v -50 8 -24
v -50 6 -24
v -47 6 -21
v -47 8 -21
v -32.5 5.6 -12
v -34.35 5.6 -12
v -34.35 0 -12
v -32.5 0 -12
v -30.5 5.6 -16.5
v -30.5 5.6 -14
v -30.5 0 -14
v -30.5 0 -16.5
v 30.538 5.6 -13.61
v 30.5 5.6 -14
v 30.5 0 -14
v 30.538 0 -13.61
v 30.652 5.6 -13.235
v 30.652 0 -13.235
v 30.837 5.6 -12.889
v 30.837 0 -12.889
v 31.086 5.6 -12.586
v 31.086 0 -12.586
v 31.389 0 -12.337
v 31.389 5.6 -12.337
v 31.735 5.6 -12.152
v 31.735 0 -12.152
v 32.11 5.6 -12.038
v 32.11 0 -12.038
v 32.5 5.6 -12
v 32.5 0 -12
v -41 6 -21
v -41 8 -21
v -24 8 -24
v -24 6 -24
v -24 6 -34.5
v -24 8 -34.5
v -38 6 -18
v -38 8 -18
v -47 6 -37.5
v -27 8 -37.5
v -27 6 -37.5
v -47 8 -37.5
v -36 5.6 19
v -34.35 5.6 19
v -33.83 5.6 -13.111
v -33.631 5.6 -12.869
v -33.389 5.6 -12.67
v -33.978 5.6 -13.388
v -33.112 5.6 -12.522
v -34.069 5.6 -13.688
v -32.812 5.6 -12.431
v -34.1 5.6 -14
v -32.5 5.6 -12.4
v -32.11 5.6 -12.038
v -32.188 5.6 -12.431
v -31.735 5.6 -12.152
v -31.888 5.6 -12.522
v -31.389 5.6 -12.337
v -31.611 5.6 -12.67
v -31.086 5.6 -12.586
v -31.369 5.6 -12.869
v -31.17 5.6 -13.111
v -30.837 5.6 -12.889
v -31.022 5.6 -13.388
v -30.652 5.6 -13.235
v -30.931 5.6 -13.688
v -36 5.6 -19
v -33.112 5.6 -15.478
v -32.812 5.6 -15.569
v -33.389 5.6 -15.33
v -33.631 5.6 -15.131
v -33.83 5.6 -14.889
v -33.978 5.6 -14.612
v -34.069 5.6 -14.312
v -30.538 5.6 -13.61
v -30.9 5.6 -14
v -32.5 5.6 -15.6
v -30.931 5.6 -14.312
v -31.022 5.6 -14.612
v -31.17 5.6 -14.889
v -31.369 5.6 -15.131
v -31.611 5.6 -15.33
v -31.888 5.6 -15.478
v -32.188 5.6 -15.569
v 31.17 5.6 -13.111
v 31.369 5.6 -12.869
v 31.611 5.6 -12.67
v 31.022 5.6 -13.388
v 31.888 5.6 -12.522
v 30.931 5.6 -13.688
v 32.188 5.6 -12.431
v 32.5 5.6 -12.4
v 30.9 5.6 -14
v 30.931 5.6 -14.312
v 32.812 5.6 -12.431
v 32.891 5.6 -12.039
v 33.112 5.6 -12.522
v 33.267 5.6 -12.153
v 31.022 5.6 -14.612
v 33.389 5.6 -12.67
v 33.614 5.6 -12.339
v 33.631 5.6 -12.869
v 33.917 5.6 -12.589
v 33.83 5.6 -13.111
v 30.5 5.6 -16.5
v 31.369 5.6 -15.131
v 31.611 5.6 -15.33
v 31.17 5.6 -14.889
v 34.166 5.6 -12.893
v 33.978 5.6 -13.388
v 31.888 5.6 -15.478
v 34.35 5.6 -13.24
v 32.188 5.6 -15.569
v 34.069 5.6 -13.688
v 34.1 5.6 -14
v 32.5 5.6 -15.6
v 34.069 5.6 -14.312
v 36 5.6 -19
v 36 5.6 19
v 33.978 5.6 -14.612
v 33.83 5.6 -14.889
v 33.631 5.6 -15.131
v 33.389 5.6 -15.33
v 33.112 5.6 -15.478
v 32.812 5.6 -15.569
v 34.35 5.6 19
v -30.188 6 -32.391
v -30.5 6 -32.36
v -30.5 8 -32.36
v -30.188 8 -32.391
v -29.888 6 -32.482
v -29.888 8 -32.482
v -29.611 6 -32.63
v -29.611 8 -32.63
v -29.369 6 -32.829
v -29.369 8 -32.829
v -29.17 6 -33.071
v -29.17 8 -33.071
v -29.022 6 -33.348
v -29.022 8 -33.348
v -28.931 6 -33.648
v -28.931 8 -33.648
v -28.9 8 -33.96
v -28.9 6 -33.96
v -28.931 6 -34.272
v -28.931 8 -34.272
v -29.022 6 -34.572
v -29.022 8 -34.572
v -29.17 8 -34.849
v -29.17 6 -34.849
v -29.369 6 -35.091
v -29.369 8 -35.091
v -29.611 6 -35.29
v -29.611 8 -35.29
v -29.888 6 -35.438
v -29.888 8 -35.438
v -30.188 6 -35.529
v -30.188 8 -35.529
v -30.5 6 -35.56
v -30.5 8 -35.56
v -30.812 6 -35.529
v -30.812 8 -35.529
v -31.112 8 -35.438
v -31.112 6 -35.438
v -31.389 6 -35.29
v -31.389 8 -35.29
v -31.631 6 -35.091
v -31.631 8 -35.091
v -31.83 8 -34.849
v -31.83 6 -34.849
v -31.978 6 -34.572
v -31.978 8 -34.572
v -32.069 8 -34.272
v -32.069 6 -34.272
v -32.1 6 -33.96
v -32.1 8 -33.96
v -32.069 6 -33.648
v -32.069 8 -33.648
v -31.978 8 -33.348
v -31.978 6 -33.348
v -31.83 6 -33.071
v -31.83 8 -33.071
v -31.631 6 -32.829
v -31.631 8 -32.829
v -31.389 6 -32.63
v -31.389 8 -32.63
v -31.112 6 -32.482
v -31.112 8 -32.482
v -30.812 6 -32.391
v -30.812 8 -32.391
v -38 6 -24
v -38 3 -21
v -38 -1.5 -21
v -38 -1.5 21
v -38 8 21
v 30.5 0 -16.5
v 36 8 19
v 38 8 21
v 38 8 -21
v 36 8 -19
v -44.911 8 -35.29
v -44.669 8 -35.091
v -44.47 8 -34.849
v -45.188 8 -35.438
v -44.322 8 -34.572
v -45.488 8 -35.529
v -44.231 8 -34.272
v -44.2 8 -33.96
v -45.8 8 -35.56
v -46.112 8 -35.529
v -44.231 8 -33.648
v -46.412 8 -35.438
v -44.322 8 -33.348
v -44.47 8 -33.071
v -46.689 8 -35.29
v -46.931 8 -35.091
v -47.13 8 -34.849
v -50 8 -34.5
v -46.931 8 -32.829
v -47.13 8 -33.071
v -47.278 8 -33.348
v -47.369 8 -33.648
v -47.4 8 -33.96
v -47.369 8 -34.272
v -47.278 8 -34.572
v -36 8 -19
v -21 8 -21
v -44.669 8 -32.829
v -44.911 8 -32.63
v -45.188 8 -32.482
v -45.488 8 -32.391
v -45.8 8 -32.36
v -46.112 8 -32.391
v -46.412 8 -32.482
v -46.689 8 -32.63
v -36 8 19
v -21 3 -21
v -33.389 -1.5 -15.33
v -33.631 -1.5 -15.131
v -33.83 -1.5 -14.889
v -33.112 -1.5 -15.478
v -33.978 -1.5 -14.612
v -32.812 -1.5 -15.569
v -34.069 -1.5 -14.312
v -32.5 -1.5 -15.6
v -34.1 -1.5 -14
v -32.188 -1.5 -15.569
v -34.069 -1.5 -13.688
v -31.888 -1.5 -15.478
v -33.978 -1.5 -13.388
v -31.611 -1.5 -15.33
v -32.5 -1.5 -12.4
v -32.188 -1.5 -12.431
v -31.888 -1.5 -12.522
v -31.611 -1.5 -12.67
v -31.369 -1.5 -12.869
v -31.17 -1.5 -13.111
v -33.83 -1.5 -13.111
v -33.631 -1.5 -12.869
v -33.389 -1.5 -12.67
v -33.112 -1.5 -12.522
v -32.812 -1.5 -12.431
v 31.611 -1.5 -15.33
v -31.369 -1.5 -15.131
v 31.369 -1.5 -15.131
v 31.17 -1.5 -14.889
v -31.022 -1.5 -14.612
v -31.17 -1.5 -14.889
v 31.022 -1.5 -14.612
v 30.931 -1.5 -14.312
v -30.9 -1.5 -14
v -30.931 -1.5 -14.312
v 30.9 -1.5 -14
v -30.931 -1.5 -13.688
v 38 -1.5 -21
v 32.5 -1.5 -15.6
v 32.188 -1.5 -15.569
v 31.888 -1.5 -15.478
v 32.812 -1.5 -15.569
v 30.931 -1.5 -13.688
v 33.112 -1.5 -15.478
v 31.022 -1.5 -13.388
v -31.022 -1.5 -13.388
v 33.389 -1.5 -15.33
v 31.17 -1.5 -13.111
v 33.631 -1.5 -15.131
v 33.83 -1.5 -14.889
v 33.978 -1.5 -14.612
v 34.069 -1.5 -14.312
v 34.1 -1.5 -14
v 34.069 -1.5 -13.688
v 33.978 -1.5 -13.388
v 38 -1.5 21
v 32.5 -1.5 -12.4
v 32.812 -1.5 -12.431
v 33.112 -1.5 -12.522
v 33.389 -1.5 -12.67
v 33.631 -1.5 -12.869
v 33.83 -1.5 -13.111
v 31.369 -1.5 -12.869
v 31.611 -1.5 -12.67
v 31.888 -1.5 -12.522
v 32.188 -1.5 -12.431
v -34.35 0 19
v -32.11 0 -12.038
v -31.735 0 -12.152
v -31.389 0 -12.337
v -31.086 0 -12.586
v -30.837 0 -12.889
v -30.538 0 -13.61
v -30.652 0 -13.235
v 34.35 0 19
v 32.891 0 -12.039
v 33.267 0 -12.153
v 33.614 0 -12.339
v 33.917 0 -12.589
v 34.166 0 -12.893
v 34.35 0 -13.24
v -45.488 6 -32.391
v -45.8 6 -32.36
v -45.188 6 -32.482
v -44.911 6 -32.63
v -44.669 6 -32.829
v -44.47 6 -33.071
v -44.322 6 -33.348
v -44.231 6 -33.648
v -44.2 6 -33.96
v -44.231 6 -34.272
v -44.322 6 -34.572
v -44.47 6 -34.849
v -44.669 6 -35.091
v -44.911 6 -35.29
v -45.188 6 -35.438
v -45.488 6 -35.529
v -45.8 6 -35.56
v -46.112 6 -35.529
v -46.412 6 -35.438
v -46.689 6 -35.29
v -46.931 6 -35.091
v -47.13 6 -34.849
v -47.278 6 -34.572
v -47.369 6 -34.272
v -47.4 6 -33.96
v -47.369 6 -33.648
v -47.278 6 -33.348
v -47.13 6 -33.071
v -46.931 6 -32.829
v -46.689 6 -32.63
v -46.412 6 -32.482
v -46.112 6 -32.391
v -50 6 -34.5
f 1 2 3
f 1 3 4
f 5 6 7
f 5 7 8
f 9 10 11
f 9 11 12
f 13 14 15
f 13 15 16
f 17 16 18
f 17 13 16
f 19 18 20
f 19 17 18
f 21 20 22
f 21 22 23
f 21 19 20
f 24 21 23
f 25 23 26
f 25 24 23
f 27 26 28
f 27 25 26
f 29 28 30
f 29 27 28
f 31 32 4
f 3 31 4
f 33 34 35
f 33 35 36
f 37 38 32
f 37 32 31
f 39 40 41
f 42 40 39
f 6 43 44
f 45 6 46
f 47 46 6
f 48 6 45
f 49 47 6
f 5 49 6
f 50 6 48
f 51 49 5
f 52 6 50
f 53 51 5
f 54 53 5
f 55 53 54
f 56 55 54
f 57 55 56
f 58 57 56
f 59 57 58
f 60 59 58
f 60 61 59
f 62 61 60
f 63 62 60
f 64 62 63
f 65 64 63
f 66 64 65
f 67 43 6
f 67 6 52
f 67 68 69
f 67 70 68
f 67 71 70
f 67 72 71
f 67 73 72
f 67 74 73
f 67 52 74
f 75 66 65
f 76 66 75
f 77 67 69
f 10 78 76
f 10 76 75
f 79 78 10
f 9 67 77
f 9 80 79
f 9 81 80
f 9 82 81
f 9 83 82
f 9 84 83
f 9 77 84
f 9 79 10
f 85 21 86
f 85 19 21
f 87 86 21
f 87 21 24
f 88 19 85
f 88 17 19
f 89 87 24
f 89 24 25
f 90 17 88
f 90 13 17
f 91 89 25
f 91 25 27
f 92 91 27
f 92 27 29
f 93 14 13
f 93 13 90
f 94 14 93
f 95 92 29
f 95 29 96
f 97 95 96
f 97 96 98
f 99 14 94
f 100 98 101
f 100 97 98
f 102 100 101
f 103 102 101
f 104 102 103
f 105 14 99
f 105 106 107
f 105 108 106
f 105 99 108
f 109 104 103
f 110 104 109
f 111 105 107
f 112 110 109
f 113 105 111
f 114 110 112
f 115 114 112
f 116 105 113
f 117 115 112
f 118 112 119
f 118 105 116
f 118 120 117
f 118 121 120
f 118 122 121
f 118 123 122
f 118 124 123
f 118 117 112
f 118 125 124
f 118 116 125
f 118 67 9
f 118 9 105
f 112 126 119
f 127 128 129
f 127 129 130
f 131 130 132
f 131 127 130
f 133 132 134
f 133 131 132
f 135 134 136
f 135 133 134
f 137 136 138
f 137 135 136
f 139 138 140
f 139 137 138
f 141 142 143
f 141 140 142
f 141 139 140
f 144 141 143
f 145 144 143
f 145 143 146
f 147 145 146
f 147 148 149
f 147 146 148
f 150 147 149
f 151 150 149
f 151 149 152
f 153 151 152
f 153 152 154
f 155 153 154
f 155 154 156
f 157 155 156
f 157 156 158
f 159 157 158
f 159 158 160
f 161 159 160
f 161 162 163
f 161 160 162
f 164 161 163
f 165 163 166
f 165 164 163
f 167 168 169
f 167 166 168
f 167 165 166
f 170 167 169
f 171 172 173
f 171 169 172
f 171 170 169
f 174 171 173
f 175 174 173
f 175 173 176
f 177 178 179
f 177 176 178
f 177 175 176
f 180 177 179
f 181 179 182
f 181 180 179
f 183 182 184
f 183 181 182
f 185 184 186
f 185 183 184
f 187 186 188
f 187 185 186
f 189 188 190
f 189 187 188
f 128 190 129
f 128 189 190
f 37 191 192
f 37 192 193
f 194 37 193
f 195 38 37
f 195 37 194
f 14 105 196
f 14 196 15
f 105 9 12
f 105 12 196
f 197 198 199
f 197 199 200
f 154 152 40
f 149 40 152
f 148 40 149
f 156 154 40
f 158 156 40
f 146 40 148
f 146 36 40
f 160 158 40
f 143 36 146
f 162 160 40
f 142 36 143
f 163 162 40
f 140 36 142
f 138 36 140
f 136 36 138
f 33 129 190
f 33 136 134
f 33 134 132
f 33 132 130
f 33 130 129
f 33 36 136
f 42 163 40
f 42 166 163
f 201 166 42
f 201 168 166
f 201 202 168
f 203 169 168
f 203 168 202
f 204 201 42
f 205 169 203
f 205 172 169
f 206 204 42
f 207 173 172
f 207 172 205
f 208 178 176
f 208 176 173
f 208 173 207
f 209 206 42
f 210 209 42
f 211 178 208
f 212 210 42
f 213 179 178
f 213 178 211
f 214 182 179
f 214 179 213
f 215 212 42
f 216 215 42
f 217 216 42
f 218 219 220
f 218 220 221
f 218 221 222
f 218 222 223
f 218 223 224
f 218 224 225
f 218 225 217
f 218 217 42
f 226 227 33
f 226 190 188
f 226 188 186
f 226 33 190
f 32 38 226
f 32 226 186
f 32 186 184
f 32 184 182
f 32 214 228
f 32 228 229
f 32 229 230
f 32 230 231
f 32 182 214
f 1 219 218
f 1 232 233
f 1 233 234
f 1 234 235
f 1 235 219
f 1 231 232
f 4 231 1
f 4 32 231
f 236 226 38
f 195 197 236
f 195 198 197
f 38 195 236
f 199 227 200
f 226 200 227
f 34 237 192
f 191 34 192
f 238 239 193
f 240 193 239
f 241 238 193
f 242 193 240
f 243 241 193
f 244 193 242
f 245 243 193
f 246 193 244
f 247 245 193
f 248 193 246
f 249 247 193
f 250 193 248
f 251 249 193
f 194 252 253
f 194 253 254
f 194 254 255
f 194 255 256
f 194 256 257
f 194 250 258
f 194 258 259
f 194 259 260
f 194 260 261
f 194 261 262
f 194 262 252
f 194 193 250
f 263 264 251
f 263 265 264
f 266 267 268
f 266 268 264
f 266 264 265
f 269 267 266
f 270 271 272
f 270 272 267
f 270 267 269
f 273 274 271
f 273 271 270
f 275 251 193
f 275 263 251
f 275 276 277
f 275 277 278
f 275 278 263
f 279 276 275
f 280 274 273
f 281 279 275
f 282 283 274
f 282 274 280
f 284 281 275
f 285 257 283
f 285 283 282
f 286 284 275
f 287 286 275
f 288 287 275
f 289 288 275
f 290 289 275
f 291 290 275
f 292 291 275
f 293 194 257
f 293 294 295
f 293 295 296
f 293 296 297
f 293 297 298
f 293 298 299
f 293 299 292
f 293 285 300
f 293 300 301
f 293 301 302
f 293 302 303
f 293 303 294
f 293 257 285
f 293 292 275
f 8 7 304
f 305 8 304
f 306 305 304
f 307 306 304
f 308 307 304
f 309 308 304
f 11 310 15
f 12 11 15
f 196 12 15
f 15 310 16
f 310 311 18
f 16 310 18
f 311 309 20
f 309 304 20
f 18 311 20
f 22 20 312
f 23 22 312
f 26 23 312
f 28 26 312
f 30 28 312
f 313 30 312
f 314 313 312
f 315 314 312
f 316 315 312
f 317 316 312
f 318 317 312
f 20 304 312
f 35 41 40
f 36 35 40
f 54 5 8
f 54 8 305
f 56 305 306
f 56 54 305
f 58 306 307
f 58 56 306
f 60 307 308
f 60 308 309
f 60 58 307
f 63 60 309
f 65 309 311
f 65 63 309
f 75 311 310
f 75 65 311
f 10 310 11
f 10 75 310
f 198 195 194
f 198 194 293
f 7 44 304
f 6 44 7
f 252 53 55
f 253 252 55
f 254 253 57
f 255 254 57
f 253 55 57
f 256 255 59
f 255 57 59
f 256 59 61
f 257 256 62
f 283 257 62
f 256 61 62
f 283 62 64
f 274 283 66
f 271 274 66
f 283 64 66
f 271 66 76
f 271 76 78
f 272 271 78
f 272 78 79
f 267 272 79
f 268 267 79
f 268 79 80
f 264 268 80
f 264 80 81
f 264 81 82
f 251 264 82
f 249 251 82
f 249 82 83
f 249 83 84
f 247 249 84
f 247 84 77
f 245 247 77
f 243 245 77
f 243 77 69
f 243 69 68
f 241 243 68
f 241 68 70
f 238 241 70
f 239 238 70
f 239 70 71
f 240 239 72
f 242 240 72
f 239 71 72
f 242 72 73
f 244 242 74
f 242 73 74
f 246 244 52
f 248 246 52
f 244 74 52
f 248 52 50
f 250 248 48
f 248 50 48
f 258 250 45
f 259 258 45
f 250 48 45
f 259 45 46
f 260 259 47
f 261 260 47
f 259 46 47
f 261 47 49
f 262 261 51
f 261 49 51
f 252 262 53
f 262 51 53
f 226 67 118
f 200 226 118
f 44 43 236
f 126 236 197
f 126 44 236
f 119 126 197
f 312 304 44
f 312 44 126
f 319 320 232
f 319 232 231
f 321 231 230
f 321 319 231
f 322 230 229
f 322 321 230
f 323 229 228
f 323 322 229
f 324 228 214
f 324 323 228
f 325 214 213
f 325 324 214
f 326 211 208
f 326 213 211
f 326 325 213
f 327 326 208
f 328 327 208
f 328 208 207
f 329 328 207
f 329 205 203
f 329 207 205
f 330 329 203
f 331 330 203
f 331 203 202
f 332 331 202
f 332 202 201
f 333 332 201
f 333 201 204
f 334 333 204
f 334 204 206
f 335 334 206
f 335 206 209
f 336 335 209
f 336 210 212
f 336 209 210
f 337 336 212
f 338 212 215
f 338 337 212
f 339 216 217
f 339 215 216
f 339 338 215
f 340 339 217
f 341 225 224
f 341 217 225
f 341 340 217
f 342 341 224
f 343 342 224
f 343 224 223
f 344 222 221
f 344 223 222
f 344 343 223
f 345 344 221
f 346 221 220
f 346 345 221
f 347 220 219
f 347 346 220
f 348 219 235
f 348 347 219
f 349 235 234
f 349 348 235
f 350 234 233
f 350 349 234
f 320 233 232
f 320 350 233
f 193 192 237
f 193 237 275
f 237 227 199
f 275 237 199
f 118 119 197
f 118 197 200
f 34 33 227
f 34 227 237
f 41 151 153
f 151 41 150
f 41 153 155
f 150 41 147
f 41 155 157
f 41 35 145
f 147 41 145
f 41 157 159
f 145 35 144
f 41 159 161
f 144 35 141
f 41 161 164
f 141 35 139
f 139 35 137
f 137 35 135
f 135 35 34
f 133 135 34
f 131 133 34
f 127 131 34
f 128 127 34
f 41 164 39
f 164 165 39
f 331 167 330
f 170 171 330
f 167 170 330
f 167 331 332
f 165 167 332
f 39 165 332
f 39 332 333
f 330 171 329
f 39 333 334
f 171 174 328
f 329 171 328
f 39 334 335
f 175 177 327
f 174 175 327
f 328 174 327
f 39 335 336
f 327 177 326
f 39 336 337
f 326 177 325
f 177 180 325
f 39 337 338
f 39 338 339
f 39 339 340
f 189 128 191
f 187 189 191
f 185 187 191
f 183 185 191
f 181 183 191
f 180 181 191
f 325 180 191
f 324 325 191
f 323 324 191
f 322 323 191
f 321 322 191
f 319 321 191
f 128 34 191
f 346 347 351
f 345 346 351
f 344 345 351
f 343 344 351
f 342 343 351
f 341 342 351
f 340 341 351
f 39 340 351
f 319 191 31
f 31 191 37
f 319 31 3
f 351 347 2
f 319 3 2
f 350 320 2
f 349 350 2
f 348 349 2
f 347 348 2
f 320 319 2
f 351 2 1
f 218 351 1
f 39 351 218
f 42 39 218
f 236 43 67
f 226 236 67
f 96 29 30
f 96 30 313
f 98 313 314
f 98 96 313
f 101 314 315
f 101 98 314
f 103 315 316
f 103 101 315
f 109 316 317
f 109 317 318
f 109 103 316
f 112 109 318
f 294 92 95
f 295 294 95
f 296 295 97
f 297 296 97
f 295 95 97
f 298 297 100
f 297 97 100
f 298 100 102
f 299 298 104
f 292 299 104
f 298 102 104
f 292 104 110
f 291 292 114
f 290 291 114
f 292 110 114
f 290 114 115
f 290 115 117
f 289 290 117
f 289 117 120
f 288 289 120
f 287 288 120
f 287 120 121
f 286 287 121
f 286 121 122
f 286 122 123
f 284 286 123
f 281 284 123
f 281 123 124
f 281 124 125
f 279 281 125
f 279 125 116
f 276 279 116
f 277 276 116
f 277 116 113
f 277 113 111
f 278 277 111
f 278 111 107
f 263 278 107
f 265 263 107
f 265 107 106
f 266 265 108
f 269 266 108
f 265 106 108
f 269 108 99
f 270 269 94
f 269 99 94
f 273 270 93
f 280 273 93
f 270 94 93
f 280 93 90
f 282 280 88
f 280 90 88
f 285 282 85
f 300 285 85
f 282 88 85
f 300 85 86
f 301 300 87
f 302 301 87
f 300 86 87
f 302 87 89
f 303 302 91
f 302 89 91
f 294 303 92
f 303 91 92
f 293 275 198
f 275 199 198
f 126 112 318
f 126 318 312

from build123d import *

# Parameters (mm, degrees)
SKETCH1_W               = 76
SKETCH1_H               = 42
SKETCH1_W_2             = 72
SKETCH1_H_2             = 38
BOSS_EXTRUDE1_DEPTH     = 8
SKETCH2_W               = 76
SKETCH2_H               = 42
BOSS_EXTRUDE2_DEPTH     = 1.5
BOSS_EXTRUDE3_START     = -2.4
BOSS_EXTRUDE3_DEPTH     = 7.1
SKETCH4_R               = 1.6
CUT_EXTRUDE1_DEPTH      = 10
SKETCH6_W               = 26
SKETCH6_H               = 2
BOSS_EXTRUDE4_DEPTH     = 16.5
CHAMFER1_SIZE           = 3
CHAMFER2_SIZE           = 3
CUT_EXTRUDE2_DEPTH      = 64.217877218
CUT_EXTRUDE2_DEPTH_BACK = 64.217877218
SKETCH7_R               = 1.6
CHAMFER3_SIZE           = 3


with BuildPart() as part:
    # Sketch1 → Boss-Extrude1 (new body)
    with BuildSketch(Plane(origin=(0, 0, 0), x_dir=(1, 0, 0), z_dir=(0, 1, 0))):
        Rectangle(SKETCH1_W, SKETCH1_H)
        Rectangle(SKETCH1_W_2, SKETCH1_H_2, mode=Mode.SUBTRACT)
    extrude(amount=BOSS_EXTRUDE1_DEPTH)

    # Sketch2 → Boss-Extrude2 (add)
    with BuildSketch(Plane.XZ):
        Rectangle(SKETCH2_W, SKETCH2_H)
    extrude(amount=BOSS_EXTRUDE2_DEPTH)

    # Sketch3 → Boss-Extrude3 (add)
    with BuildSketch(Plane(origin=(0, 8, 0), x_dir=(1, 0, 0), z_dir=(0, 1, 0)).offset(BOSS_EXTRUDE3_START)):
        Polygon((-36, 19), (-36, 16.5), (-34.35, 16.5), (-30.5, 16.5), (30.5, 16.5), (34.35, 16.5), (36, 16.5), (36, 19), align=None)
        with BuildLine():
            Line((-34.35, 16.5), (-36, 16.5))
            Line((-36, 16.5), (-36, -19))
            Line((-36, -19), (-34.35, -19))
            Line((-34.35, -19), (-34.35, 12))
            Line((-34.35, 12), (-34.35, 13.240065792))
            ThreePointArc((-34.35, 13.240065792), (-34.5, 14), (-34.35, 14.759934208))
            Line((-34.35, 14.759934208), (-34.35, 16.5))
        make_face()
        with BuildLine():
            Line((-30.5, 16.5), (-34.35, 16.5))
            Line((-34.35, 16.5), (-34.35, 14.759934208))
            ThreePointArc((-34.35, 14.759934208), (-32.112701665, 15.962141687), (-30.5, 14))
            Line((-30.5, 14), (-30.5, 16.5))
        make_face()
        with BuildLine():
            ThreePointArc((-32.5, 12), (-33.613582414, 12.338695029), (-34.35, 13.240065792))
            Line((-34.35, 13.240065792), (-34.35, 12))
            Line((-34.35, 12), (-32.5, 12))
        make_face()
        with BuildLine():
            ThreePointArc((-30.5, 14), (-32.112701665, 15.962141687), (-34.35, 14.759934208))
            Line((-34.35, 14.759934208), (-34.35, 13.240065792))
            ThreePointArc((-34.35, 13.240065792), (-33.613582414, 12.338695029), (-32.5, 12))
            ThreePointArc((-32.5, 12), (-31.085786438, 12.585786438), (-30.5, 14))
        make_face()
        with BuildLine():
            Line((-34.35, 13.240065792), (-34.35, 14.759934208))
            ThreePointArc((-34.35, 14.759934208), (-34.5, 14), (-34.35, 13.240065792))
        make_face()
        with BuildLine():
            ThreePointArc((34.35, 14.759934208), (32.112701665, 15.962141687), (30.5, 14))
            ThreePointArc((30.5, 14), (31.085786438, 12.585786438), (32.5, 12))
            ThreePointArc((32.5, 12), (33.613582414, 12.338695029), (34.35, 13.240065792))
            Line((34.35, 13.240065792), (34.35, 14.759934208))
        make_face()
        with BuildLine():
            ThreePointArc((34.5, 14), (34.462141687, 14.387298335), (34.35, 14.759934208))
            Line((34.35, 14.759934208), (34.35, 13.240065792))
            ThreePointArc((34.35, 13.240065792), (34.462141687, 13.612701665), (34.5, 14))
        make_face()
        with BuildLine():
            Line((34.35, 16.5), (30.5, 16.5))
            Line((30.5, 16.5), (30.5, 14))
            ThreePointArc((30.5, 14), (32.112701665, 15.962141687), (34.35, 14.759934208))
            Line((34.35, 14.759934208), (34.35, 16.5))
        make_face()
        with BuildLine():
            Line((36, -19), (36, 16.5))
            Line((36, 16.5), (34.35, 16.5))
            Line((34.35, 16.5), (34.35, 14.759934208))
            ThreePointArc((34.35, 14.759934208), (34.462141687, 14.387298335), (34.5, 14))
            ThreePointArc((34.5, 14), (34.462141687, 13.612701665), (34.35, 13.240065792))
            Line((34.35, 13.240065792), (34.35, 12))
            Line((34.35, 12), (34.35, -19))
            Line((34.35, -19), (36, -19))
        make_face()
    extrude(amount=-BOSS_EXTRUDE3_DEPTH)

    # Sketch4 → Cut-Extrude1 (cut)
    with BuildSketch(Plane(origin=(0, 5.6, 0), x_dir=(1, 0, 0), z_dir=(0, 1, 0))):
        with Locations(Location((32.5, 14, 0), (0, 0, 270))):
            Circle(SKETCH4_R)
        with Locations(Location((-32.5, 14, 0), (0, 0, 270))):
            Circle(SKETCH4_R)
    extrude(amount=-CUT_EXTRUDE1_DEPTH, mode=Mode.SUBTRACT)

    # Sketch6 → Boss-Extrude4 (add)
    with BuildSketch(Plane(origin=(0, 0, -21), x_dir=(-1, 0, 0), z_dir=(0, 0, -1))):
        with Locations((37, 7)):
            Rectangle(SKETCH6_W, SKETCH6_H)
    extrude(amount=BOSS_EXTRUDE4_DEPTH)

    # Chamfer1
    chamfer1_edges = [part.edges().sort_by_distance(p)[0] for p in [
        (-31, 6, -21),
    ]]
    chamfer(chamfer1_edges, length=CHAMFER1_SIZE)

    # Chamfer2
    chamfer2_edges = [part.edges().sort_by_distance(p)[0] for p in [
        (-24, 5.5, -21),
        (-24, 7, -37.5),
        (-50, 7, -37.5),
        (-50, 7, -21),
    ]]
    chamfer(chamfer2_edges, length=CHAMFER2_SIZE)

    # Sketch7 → Cut-Extrude2 (cut, two sides: drawn at the far end of the back side and taken through both)
    with BuildSketch(Plane(origin=(0, 8, 0), x_dir=(1, 0, 0), z_dir=(0, 1, 0)).offset(-CUT_EXTRUDE2_DEPTH_BACK)):
        with Locations(Location((-30.5, 33.96, 0), (0, 0, 270))):
            Circle(SKETCH7_R)
        with Locations(Location((-45.8, 33.96, 0), (0, 0, 270))):
            Circle(SKETCH7_R)
    extrude(amount=CUT_EXTRUDE2_DEPTH + CUT_EXTRUDE2_DEPTH_BACK, mode=Mode.SUBTRACT)

    # Chamfer3
    chamfer3_edges = [part.edges().sort_by_distance(p)[0] for p in [
        (-38, 7, -21),
    ]]
    chamfer(chamfer3_edges, length=CHAMFER3_SIZE)


solid = part.part
